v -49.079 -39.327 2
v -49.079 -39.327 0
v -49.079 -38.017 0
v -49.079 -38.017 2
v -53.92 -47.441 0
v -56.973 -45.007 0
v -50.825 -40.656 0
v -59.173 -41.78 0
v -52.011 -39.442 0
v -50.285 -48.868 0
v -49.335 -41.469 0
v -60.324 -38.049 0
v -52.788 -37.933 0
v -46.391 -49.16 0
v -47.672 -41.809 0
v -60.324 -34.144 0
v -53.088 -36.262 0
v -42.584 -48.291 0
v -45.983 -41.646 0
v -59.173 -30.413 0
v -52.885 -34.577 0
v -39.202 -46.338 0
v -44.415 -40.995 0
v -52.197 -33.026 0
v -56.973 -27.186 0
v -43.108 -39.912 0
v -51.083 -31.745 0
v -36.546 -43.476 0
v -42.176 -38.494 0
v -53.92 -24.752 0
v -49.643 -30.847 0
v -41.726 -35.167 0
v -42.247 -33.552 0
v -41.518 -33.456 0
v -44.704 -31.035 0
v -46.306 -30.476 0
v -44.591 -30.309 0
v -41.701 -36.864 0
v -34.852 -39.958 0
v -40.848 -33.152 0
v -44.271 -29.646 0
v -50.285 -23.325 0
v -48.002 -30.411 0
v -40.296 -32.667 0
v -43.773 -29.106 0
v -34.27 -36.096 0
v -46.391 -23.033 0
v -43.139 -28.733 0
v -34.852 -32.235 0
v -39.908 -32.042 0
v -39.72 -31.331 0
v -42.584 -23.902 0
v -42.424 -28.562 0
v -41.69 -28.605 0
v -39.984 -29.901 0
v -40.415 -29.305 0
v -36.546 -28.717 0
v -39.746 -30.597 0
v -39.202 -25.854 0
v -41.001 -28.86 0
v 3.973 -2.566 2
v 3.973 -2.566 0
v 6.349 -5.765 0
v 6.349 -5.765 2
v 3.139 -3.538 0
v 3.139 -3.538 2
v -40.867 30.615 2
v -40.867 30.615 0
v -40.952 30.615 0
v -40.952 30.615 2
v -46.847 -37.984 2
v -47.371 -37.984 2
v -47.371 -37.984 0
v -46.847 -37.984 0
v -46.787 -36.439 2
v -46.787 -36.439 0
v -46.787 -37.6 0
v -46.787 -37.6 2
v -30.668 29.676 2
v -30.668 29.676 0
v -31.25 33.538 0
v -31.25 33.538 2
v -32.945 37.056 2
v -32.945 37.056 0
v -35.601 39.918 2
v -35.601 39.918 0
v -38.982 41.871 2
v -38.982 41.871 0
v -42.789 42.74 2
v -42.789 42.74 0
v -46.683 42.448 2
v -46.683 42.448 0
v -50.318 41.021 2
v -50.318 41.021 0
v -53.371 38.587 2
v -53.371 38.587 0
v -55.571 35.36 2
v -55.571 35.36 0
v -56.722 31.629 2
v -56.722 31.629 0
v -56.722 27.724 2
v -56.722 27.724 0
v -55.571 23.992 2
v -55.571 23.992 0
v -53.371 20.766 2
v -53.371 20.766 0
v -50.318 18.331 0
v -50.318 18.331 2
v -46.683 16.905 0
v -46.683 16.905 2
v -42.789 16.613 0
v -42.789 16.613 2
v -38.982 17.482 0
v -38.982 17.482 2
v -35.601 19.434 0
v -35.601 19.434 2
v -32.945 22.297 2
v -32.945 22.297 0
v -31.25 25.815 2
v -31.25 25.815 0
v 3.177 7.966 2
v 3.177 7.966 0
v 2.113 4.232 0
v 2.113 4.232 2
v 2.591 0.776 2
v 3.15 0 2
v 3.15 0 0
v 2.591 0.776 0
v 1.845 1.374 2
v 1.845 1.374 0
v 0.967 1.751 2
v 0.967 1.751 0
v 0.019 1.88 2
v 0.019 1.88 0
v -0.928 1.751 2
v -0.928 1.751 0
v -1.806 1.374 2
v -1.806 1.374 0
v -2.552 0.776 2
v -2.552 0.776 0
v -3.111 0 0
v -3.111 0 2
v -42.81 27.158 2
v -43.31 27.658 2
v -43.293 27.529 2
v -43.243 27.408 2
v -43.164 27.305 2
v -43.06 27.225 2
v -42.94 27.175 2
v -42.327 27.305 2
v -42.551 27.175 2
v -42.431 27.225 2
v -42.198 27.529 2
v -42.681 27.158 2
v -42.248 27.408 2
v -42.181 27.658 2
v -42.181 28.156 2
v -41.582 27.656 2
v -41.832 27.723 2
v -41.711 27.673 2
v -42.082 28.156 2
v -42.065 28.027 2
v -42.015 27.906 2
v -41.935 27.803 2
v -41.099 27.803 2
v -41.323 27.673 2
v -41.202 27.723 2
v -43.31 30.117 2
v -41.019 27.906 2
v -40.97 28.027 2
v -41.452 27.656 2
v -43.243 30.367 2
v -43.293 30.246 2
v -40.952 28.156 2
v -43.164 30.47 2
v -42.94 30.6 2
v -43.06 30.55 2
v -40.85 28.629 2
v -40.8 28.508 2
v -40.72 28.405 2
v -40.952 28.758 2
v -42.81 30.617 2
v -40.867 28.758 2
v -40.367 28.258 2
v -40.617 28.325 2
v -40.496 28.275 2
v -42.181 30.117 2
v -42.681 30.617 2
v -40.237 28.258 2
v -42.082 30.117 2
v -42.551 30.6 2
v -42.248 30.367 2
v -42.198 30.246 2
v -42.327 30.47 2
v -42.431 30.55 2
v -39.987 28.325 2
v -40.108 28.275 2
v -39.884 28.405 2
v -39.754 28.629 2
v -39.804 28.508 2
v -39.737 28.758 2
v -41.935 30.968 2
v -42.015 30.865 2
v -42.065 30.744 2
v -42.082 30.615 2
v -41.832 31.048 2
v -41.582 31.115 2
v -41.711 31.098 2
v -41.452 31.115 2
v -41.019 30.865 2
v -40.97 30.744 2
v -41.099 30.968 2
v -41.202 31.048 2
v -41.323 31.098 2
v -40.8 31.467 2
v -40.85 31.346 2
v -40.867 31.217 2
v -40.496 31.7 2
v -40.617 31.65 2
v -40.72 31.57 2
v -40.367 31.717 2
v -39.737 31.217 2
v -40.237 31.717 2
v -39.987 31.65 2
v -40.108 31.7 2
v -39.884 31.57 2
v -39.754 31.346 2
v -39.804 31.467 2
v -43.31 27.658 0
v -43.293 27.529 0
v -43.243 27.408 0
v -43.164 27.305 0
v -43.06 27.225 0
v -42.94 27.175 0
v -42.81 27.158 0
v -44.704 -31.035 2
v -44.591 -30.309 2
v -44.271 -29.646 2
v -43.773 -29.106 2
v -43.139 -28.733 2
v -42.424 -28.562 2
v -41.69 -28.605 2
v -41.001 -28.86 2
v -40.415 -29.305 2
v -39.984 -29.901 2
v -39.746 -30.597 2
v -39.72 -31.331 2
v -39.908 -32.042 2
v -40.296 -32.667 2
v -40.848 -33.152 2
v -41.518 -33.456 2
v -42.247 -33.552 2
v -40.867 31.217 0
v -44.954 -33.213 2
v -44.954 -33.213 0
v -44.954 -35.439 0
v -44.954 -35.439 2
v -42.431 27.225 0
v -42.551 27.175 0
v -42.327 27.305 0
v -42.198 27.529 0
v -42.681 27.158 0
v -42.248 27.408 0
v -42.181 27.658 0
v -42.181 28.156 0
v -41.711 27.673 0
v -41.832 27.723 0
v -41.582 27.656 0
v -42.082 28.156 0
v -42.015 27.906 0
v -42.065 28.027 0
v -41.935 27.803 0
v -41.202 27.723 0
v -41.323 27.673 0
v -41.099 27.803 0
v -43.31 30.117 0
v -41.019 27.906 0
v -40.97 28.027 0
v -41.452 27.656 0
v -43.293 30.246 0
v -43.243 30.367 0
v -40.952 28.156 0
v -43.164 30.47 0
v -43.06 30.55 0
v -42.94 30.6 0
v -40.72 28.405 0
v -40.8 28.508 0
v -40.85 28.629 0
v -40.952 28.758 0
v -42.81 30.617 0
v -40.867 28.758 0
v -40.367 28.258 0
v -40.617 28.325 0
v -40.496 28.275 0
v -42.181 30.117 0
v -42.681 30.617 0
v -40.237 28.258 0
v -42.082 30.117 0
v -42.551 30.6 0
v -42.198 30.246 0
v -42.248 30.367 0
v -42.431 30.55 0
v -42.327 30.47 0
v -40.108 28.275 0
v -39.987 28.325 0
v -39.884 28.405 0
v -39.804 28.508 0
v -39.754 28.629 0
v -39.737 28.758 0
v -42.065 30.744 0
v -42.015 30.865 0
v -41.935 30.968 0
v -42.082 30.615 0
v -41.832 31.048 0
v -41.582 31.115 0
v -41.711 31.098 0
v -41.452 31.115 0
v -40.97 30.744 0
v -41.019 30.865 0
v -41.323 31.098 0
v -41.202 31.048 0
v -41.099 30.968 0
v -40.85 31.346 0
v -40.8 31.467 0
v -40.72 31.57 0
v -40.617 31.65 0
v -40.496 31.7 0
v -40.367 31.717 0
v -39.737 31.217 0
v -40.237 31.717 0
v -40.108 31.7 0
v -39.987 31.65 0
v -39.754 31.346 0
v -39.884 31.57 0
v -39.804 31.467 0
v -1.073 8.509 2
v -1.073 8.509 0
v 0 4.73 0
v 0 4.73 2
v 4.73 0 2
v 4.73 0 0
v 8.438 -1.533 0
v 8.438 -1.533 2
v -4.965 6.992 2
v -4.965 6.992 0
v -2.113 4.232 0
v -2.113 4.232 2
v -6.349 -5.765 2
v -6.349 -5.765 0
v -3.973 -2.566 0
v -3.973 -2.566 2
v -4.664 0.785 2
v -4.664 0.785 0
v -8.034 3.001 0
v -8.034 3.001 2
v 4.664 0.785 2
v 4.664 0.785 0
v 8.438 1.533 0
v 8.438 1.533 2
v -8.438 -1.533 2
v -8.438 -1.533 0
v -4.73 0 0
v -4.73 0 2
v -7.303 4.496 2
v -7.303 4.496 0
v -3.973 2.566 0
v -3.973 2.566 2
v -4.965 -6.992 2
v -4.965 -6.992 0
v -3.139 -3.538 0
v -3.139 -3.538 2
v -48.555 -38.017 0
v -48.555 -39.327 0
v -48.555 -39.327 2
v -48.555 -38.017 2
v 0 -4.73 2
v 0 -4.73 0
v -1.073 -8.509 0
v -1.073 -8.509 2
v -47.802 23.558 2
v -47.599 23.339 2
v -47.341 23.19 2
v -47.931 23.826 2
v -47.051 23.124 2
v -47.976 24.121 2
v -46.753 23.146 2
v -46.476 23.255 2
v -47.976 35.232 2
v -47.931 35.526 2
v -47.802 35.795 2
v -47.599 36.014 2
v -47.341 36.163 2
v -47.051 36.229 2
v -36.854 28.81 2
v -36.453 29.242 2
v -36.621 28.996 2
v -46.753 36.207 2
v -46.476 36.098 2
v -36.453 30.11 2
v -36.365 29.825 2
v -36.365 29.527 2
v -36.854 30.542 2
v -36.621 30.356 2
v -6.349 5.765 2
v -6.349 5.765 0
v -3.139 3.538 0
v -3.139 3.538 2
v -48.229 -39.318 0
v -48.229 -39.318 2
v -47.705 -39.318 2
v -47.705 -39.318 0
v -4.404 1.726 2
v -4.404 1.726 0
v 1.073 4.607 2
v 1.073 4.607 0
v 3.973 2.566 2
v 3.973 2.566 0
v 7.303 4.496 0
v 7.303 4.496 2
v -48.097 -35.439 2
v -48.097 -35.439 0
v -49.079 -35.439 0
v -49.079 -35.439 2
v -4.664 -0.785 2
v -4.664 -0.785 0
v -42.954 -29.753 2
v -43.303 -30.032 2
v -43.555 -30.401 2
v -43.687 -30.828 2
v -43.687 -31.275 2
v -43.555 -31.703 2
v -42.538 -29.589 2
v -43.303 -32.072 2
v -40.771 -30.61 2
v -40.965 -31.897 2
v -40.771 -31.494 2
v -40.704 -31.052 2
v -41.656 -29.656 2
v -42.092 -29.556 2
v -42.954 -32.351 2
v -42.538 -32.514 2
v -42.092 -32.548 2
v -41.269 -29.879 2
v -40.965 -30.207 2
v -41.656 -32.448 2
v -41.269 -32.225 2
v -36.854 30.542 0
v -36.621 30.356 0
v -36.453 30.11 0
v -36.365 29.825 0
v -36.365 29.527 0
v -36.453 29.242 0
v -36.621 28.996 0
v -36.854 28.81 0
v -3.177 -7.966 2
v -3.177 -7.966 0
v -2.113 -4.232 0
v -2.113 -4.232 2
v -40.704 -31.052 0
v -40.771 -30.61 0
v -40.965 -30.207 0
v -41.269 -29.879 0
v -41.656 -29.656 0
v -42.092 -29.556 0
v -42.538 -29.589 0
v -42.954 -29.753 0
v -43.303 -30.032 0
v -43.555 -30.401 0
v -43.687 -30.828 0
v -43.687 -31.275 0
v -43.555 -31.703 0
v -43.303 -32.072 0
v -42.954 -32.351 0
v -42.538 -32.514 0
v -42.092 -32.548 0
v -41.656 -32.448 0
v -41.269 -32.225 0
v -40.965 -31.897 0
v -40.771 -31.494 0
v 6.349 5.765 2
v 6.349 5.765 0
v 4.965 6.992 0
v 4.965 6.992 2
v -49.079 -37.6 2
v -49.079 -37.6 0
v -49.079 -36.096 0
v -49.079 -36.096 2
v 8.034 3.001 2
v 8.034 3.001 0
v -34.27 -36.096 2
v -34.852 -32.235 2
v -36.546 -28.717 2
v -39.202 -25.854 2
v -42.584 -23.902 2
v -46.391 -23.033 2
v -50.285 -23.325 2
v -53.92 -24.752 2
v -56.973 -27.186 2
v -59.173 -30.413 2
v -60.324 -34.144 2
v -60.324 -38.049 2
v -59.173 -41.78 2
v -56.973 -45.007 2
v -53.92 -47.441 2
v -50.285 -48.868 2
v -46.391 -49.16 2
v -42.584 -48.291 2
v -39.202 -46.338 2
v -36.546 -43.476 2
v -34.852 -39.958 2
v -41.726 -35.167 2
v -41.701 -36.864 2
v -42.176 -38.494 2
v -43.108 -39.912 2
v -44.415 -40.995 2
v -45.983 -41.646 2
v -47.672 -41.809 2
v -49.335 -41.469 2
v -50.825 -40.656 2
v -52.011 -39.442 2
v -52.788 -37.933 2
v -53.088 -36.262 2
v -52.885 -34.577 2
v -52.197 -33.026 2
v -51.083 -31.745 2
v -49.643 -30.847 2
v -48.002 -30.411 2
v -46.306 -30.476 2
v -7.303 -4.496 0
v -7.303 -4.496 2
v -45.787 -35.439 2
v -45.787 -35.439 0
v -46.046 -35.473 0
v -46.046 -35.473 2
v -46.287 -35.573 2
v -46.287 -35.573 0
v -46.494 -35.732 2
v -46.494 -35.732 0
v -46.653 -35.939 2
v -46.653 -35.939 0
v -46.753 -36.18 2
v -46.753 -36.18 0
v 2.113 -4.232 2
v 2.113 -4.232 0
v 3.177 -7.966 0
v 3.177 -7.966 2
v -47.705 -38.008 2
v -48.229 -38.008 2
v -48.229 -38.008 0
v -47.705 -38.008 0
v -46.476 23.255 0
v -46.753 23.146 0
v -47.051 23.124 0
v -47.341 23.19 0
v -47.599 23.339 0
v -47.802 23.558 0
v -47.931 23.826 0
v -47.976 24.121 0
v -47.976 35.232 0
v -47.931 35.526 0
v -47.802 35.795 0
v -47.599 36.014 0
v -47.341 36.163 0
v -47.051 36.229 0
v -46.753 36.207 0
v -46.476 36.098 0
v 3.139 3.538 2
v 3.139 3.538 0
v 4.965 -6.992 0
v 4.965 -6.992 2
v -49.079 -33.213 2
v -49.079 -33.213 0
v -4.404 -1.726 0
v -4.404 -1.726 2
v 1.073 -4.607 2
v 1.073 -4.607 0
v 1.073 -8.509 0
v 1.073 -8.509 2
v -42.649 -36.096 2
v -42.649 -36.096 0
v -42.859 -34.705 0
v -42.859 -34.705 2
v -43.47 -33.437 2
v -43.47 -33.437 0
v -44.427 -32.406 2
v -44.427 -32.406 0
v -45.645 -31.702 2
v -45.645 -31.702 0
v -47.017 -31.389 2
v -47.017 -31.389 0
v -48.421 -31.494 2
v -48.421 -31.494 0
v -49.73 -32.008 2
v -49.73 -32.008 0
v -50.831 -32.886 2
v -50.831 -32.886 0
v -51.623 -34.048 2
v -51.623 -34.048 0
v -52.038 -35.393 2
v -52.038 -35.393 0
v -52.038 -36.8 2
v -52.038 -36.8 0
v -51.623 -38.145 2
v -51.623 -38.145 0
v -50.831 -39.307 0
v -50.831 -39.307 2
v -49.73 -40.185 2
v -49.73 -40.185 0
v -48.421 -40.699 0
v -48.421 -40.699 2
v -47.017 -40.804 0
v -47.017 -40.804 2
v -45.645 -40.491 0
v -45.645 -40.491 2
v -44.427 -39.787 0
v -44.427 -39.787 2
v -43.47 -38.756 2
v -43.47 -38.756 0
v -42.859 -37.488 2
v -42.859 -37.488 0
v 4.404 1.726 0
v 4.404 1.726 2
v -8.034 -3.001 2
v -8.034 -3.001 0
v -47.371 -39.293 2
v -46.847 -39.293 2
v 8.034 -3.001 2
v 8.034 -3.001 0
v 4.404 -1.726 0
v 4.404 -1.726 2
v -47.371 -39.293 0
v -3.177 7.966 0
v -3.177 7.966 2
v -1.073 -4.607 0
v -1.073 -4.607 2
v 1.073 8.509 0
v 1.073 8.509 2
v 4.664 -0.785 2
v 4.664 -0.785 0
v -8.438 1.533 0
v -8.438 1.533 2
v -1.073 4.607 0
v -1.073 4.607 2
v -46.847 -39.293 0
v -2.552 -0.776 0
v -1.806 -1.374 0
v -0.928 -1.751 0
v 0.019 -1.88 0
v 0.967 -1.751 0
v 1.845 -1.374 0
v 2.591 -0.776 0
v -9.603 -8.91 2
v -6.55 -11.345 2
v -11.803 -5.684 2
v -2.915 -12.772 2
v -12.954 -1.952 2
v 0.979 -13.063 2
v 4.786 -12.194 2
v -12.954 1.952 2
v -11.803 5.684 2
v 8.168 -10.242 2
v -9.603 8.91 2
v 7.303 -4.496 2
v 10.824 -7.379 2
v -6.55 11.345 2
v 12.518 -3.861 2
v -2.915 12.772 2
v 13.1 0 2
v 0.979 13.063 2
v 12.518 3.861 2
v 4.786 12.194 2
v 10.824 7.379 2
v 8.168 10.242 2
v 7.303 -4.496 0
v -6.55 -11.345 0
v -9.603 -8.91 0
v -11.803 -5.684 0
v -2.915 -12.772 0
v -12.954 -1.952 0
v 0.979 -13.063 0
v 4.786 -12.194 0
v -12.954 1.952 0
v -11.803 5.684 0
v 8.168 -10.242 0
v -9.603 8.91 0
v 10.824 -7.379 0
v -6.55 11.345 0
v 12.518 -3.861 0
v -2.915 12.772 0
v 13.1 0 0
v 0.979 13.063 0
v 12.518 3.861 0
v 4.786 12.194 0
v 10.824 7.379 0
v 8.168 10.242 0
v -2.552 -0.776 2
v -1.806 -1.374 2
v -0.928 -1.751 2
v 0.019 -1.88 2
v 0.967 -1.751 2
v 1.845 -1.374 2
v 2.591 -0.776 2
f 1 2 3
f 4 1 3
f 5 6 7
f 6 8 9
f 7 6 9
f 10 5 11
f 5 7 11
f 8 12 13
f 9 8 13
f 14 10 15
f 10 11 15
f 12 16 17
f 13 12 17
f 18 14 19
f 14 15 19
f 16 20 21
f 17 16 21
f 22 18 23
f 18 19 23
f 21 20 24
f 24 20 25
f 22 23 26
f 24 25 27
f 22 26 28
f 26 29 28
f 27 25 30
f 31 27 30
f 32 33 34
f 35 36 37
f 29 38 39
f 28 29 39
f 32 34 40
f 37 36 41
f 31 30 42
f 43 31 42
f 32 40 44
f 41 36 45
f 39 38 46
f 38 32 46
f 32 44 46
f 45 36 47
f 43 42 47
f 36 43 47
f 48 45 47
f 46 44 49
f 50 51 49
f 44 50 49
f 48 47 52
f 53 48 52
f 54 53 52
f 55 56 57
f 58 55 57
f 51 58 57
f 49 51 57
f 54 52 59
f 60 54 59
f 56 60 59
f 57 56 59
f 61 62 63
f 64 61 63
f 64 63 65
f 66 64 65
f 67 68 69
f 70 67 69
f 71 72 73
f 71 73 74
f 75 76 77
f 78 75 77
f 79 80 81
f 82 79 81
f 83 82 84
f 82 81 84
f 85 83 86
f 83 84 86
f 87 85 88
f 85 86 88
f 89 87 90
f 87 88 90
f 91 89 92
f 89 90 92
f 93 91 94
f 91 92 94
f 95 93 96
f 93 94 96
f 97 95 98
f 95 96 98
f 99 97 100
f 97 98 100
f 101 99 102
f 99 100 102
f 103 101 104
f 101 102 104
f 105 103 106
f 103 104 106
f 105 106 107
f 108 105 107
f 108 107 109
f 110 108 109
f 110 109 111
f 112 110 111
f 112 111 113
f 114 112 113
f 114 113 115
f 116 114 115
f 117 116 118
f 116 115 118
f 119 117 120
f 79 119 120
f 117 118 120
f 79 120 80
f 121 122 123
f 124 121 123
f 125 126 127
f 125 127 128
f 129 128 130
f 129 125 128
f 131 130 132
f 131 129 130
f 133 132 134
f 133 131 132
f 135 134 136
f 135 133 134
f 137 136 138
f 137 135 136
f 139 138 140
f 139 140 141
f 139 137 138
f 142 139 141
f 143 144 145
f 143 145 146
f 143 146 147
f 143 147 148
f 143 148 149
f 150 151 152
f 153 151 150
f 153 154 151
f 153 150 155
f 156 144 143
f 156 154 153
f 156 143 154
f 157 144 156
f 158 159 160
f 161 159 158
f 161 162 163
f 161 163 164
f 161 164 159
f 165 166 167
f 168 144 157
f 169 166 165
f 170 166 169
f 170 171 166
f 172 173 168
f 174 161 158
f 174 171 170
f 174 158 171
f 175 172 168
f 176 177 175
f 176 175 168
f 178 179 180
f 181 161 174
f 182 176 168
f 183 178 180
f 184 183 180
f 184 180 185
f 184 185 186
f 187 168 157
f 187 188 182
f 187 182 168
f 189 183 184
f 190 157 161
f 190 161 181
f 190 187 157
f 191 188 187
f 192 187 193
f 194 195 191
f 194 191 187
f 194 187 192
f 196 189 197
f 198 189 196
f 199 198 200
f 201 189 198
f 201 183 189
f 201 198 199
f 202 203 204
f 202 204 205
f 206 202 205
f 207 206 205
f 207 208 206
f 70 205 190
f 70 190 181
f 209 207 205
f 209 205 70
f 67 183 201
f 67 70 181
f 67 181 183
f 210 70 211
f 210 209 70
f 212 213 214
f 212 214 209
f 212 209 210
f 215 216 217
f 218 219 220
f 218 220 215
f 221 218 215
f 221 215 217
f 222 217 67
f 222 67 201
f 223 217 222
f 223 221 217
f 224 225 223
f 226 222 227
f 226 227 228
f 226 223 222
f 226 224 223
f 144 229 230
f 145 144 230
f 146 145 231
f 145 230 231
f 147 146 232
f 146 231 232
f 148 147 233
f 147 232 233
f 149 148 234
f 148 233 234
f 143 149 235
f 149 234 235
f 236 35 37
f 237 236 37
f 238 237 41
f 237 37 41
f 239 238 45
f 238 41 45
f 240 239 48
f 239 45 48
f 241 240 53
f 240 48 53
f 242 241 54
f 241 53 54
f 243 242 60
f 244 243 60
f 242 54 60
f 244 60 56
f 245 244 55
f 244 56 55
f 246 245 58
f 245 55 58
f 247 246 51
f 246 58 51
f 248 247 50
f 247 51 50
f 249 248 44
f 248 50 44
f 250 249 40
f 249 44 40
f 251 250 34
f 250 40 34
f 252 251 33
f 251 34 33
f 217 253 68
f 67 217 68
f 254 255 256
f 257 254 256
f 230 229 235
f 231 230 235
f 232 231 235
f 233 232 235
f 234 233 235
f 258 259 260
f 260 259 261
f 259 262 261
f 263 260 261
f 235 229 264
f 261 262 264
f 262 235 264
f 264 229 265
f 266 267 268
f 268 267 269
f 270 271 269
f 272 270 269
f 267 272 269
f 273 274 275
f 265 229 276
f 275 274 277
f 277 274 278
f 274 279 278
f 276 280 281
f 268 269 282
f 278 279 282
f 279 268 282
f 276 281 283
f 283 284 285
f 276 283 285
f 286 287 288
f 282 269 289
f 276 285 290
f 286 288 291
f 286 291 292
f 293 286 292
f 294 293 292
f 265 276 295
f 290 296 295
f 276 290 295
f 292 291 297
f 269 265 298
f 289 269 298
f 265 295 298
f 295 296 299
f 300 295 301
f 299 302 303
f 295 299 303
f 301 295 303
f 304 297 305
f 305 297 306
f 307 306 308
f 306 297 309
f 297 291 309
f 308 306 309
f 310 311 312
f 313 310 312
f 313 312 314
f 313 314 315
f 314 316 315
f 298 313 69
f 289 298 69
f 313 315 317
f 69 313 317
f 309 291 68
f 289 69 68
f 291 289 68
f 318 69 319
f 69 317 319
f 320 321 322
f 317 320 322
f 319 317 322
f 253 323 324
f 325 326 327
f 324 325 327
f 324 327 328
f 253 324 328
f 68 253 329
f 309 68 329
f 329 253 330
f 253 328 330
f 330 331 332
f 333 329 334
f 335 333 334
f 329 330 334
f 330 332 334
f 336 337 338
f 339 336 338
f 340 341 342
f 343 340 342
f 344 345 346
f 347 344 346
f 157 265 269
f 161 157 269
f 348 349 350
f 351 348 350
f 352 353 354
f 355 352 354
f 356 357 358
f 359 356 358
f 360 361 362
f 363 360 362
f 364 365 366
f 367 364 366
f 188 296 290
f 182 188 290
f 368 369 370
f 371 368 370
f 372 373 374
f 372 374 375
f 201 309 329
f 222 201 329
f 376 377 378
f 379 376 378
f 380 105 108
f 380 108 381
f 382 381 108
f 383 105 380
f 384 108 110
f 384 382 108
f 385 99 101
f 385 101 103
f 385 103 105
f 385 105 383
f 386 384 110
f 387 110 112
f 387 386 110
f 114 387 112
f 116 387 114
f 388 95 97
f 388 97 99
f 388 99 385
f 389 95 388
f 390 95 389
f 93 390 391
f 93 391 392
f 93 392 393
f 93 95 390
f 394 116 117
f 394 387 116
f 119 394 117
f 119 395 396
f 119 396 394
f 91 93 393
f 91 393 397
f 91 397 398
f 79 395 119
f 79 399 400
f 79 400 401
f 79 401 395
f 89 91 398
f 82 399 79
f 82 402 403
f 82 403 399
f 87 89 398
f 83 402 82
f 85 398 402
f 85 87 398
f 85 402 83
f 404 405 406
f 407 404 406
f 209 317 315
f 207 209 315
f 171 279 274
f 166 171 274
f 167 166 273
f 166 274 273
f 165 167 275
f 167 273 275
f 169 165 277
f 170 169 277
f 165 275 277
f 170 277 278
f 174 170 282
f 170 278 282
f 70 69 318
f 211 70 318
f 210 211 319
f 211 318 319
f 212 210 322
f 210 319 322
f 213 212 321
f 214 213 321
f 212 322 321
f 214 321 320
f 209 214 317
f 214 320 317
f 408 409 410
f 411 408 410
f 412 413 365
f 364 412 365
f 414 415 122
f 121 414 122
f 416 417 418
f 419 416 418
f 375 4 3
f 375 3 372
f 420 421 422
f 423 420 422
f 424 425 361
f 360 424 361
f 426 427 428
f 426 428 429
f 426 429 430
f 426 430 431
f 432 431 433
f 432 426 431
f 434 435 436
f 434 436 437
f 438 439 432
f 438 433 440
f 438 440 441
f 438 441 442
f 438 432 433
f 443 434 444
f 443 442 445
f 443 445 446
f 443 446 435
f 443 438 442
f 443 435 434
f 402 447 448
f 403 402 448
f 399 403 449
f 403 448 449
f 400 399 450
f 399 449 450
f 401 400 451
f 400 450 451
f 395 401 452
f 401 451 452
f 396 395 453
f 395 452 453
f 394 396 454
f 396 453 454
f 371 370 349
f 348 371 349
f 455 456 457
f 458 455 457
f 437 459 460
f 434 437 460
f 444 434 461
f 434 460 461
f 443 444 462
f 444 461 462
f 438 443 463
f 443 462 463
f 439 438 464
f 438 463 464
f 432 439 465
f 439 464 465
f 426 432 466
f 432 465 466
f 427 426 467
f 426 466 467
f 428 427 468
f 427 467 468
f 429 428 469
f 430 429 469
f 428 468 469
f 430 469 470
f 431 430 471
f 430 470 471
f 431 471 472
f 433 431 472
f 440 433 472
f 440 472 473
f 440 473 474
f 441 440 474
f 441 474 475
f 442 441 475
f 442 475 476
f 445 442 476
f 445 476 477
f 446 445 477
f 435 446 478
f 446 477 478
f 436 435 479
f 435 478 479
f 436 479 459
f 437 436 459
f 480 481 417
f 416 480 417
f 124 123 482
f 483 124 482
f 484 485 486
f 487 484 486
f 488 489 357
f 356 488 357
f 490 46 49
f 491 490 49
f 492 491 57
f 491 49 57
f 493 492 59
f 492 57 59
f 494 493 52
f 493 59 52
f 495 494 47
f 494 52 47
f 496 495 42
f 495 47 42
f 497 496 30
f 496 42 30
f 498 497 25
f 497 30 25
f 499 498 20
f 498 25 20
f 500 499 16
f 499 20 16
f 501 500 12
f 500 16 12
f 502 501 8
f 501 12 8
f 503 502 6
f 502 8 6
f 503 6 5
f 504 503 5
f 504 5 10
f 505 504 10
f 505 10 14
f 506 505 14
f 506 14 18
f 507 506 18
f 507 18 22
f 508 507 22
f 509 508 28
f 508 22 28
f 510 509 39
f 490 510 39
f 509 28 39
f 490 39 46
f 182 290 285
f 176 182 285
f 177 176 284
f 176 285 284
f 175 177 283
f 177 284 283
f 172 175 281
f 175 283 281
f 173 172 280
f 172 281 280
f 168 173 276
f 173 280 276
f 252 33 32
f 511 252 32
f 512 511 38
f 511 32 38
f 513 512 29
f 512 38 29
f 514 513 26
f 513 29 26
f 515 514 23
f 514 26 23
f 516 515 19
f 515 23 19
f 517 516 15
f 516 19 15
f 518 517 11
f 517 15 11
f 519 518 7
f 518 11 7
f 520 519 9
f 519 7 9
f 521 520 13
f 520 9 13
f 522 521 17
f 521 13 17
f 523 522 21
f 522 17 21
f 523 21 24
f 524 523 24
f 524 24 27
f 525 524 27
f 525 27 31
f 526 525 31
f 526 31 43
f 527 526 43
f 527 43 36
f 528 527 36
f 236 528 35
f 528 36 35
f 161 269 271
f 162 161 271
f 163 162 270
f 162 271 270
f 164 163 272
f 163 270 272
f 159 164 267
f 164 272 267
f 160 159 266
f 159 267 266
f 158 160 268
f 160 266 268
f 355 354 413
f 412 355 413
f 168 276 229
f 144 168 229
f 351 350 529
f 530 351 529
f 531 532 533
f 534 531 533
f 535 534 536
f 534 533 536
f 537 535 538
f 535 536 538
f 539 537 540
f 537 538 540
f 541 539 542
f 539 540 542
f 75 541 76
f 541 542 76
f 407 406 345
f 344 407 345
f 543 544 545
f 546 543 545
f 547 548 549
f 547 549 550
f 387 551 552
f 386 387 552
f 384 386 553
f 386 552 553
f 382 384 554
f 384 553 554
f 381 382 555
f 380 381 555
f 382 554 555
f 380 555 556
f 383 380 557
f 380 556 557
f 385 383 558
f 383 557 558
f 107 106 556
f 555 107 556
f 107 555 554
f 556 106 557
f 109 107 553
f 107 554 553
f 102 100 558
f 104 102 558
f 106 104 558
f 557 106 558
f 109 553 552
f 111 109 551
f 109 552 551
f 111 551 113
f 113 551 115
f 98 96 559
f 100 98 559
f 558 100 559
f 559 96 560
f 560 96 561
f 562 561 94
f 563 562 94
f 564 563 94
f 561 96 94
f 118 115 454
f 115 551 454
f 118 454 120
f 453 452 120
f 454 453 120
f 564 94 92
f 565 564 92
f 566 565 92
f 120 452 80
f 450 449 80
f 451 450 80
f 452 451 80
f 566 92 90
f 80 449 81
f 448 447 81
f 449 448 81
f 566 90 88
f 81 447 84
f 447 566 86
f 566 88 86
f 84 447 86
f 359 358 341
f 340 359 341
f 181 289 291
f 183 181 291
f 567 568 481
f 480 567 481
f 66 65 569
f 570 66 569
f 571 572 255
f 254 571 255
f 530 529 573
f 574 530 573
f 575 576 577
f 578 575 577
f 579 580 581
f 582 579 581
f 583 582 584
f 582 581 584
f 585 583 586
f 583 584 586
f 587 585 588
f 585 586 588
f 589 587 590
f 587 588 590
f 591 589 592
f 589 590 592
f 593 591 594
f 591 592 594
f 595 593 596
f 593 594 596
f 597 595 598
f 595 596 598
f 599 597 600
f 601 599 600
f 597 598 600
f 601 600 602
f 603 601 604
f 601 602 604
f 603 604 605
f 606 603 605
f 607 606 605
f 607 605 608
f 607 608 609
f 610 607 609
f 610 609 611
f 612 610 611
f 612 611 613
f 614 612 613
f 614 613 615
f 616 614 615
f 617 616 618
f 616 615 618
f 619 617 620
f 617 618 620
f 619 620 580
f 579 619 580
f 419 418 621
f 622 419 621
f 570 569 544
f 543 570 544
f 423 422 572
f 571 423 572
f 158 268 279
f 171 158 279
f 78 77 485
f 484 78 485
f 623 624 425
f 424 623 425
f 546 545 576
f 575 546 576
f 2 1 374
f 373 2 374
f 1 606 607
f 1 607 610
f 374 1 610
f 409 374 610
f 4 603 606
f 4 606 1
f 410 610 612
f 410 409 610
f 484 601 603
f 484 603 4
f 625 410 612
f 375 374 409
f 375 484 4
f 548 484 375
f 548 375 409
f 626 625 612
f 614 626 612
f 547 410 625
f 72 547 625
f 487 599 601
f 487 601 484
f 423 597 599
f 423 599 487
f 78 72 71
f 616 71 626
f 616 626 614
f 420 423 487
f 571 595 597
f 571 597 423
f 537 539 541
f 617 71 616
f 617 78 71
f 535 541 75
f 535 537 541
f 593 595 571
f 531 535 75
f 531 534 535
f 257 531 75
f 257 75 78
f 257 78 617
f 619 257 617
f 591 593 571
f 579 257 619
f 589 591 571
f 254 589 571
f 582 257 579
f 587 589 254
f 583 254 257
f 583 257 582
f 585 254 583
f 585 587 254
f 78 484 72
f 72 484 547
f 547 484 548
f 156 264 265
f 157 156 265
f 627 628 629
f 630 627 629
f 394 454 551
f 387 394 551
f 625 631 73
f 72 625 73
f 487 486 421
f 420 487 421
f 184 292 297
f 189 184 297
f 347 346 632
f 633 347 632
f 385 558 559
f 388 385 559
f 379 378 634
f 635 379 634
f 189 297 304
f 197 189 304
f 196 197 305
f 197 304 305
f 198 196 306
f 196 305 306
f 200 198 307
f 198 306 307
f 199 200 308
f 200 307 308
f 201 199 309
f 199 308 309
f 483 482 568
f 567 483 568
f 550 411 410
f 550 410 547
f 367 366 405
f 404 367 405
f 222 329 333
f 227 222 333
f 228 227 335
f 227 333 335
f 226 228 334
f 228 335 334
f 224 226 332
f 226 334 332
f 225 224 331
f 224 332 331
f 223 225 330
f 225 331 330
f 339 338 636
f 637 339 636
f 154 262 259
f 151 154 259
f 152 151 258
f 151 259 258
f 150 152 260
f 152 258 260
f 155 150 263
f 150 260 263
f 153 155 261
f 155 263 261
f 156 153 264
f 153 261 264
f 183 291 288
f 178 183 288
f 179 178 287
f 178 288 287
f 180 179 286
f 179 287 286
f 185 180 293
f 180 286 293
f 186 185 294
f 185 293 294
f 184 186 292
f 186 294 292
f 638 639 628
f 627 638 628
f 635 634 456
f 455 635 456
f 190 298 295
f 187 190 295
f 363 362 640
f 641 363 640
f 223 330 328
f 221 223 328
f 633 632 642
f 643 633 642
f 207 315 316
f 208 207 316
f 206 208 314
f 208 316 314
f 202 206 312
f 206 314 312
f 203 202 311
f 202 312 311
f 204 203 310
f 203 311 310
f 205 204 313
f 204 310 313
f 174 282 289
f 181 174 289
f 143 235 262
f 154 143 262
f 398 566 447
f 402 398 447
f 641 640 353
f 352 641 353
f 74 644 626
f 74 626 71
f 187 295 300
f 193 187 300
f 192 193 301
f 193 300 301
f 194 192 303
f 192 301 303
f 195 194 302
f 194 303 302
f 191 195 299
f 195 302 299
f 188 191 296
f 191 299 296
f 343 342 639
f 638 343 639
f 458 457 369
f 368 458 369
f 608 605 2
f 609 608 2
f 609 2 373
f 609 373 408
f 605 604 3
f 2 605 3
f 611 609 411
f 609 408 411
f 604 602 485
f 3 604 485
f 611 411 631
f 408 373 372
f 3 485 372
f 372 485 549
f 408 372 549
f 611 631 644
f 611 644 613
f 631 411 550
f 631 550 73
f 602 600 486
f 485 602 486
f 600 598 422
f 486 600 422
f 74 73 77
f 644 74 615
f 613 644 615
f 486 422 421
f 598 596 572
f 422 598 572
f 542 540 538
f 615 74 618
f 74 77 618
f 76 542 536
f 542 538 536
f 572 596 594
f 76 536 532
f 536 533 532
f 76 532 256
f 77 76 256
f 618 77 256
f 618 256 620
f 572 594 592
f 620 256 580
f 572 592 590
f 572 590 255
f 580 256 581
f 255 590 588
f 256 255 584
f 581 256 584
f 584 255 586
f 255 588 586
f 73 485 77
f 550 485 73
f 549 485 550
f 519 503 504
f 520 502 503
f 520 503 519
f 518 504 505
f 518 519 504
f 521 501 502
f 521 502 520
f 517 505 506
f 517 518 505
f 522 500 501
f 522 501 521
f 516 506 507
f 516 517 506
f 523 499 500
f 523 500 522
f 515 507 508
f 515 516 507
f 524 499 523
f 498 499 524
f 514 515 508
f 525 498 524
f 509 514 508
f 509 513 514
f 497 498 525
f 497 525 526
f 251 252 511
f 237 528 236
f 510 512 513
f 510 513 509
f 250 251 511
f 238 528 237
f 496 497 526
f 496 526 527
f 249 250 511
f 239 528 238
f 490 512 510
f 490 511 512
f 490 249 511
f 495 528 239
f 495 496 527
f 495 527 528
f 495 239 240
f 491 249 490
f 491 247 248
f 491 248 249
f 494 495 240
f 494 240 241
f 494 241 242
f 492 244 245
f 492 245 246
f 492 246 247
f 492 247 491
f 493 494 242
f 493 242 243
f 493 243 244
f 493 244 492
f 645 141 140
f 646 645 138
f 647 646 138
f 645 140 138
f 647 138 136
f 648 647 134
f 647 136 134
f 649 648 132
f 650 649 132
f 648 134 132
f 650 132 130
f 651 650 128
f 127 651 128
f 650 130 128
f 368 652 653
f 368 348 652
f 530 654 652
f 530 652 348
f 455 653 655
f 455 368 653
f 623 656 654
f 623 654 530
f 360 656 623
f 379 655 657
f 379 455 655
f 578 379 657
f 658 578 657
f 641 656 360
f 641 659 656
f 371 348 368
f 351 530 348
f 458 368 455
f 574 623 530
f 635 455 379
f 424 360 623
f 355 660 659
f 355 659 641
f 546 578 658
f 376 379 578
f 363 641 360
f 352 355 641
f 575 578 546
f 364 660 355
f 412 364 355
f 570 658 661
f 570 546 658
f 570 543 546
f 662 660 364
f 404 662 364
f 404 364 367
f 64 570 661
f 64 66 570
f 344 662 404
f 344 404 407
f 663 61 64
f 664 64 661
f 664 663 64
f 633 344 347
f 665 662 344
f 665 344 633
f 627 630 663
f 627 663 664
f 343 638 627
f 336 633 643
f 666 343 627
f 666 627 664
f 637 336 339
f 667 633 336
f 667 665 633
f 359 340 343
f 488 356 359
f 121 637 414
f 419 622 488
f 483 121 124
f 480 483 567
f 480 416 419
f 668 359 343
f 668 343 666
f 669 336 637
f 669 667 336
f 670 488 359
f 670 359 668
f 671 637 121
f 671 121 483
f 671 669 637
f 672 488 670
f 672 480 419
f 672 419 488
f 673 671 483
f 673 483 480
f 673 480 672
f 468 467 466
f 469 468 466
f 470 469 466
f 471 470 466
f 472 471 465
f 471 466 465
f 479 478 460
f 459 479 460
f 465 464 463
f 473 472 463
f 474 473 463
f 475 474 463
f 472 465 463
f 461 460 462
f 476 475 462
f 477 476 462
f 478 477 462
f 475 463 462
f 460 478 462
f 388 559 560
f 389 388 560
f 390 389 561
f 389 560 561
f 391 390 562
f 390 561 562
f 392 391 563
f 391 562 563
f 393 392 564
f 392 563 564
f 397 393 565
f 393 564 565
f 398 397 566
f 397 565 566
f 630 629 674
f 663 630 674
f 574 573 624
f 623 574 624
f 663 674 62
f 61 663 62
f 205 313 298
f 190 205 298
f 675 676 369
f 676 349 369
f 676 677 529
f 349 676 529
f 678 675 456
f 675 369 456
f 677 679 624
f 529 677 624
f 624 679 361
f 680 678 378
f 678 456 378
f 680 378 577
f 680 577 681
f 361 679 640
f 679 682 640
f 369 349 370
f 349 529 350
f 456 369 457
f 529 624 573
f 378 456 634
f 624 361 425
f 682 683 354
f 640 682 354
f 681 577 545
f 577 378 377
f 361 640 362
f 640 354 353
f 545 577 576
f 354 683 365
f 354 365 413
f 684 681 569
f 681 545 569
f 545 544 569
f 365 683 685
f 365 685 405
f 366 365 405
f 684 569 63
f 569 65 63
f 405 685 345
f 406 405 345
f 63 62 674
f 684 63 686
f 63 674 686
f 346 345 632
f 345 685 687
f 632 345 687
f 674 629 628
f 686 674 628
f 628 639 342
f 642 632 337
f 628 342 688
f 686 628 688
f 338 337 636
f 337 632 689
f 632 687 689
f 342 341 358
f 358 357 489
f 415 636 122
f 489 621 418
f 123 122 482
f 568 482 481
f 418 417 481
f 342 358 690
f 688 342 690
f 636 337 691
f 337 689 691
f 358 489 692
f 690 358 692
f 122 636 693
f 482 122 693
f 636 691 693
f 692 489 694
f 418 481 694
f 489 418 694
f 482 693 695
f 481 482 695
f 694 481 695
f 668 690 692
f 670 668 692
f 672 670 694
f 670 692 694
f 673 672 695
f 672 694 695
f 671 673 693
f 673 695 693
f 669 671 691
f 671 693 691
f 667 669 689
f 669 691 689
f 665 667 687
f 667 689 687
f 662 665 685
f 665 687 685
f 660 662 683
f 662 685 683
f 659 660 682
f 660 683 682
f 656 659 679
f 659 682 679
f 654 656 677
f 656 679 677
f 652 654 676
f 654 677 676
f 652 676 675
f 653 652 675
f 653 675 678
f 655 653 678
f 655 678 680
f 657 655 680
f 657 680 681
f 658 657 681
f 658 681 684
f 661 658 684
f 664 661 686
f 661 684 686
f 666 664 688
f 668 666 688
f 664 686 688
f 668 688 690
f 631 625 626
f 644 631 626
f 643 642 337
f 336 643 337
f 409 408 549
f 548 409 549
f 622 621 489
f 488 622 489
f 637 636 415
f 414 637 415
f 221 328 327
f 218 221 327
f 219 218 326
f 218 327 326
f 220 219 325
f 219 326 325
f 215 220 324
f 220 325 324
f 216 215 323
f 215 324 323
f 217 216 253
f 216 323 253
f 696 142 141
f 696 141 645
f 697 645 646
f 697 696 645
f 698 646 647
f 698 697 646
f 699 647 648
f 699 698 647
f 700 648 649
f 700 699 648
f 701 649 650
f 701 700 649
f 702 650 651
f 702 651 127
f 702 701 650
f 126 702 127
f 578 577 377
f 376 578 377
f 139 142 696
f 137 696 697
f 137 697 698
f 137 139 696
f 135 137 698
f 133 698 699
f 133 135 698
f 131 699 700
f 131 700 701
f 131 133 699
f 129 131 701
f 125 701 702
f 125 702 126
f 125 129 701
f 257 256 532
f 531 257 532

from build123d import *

# Parameters (mm, degrees)
F0_R     = 13.1
F1_DEPTH = 2
F3_DEPTH = 2
F2_R     = 13.1
F4_R     = 13.1
F5_DEPTH = 2
F4_R_2   = 1.5
F4_R_3   = 4.720675959
F4_W     = 0.5238242447
F4_H     = 1.3095550239
F7_DEPTH = 2


with BuildPart() as f1:
    # F0 (on Top) → F1 (new body)
    with BuildSketch(Plane.XY):
        Circle(F0_R)
        Polygon((-1.0733311857, 8.5085036043), (0, 4.73), (1.0733311857, 8.5085036043), (1.0733311857, 4.6066104856), (3.1767945382, 7.9658426974), (2.1126727823, 4.2319633405), (4.9654196676, 6.9922300407), (3.1394469995, 3.5379051057), (6.3489288674, 5.7652212147), (3.9732828103, 2.5663054591), (7.302839339, 4.4961328948), (4.403985486, 1.72563375), (8.0336946235, 3.0010704948), (4.6643889337, 0.7850960928), (8.4377682627, 1.5332123671), (4.73, 0), (8.4377682627, -1.5332123671), (4.6643889337, -0.7850960928), (8.0336946235, -3.0010704948), (4.403985486, -1.72563375), (7.302839339, -4.4961328948), (3.9732828103, -2.5663054591), (6.3489288674, -5.7652212147), (3.1394469995, -3.5379051057), (4.9654196676, -6.9922300407), (2.1126727823, -4.2319633405), (3.1767945382, -7.9658426974), (1.0733311857, -4.6066104856), (1.0733311857, -8.5085036043), (0, -4.73), (-1.0733311857, -8.5085036043), (-1.0733311857, -4.6066104856), (-3.1767945382, -7.9658426974), (-2.1126727823, -4.2319633405), (-4.9654196676, -6.9922300407), (-3.1394469995, -3.5379051057), (-6.3489288674, -5.7652212147), (-3.9732828103, -2.5663054591), (-7.302839339, -4.4961328948), (-4.403985486, -1.72563375), (-8.0336946235, -3.0010704948), (-4.6643889337, -0.7850960928), (-8.4377682627, -1.5332123671), (-4.73, 0), (-8.4377682627, 1.5332123671), (-4.6643889337, 0.7850960928), (-8.0336946235, 3.0010704948), (-4.403985486, 1.72563375), (-7.302839339, 4.4961328948), (-3.9732828103, 2.5663054591), (-6.3489288674, 5.7652212147), (-3.1394469995, 3.5379051057), (-4.9654196676, 6.9922300407), (-2.1126727823, 4.2319633405), (-3.1767945382, 7.9658426974), (-1.0733311857, 4.6066104856), align=None, mode=Mode.SUBTRACT)
    extrude(amount=F1_DEPTH)


with BuildPart() as f3:
    # F2 (on Top) → F3 (new body)
    with BuildSketch(Plane.XY):
        with BuildLine():
            ThreePointArc((-39.7374145687, 31.2168422043), (-39.8838611781, 31.5703955949), (-40.2374145687, 31.7168422043))
            Line((-40.2374145687, 31.7168422043), (-40.3667549491, 31.7168422043))
            ThreePointArc((-40.3667549491, 31.7168422043), (-40.7203083397, 31.5703955949), (-40.8667549491, 31.2168422043))
            Line((-40.8667549491, 31.2168422043), (-40.8667549491, 30.6146760359))
            Line((-40.8667549491, 30.6146760359), (-40.9524645656, 30.6146760359))
            ThreePointArc((-40.9524645656, 30.6146760359), (-41.098911175, 30.9682294265), (-41.4524645656, 31.1146760359))
            Line((-41.4524645656, 31.1146760359), (-41.5818049461, 31.1146760359))
            ThreePointArc((-41.5818049461, 31.1146760359), (-41.9353583367, 30.9682294265), (-42.0818049461, 30.6146760359))
            Line((-42.0818049461, 30.6146760359), (-42.0818049461, 30.1166922674))
            Line((-42.0818049461, 30.1166922674), (-42.1808343381, 30.1166922674))
            ThreePointArc((-42.1808343381, 30.1166922674), (-42.3272809475, 30.470245658), (-42.6808343381, 30.6166922674))
            Line((-42.6808343381, 30.6166922674), (-42.8101747185, 30.6166922674))
            ThreePointArc((-42.8101747185, 30.6166922674), (-43.1637281091, 30.470245658), (-43.3101747185, 30.1166922674))
            Line((-43.3101747185, 30.1166922674), (-43.3101747185, 27.6580899134))
            ThreePointArc((-43.3101747185, 27.6580899134), (-43.1637281091, 27.3045365228), (-42.8101747185, 27.1580899134))
            Line((-42.8101747185, 27.1580899134), (-42.6808343381, 27.1580899134))
            ThreePointArc((-42.6808343381, 27.1580899134), (-42.3272809475, 27.3045365228), (-42.1808343381, 27.6580899134))
            Line((-42.1808343381, 27.6580899134), (-42.1808343381, 28.156073682))
            Line((-42.1808343381, 28.156073682), (-42.0818049461, 28.156073682))
            ThreePointArc((-42.0818049461, 28.156073682), (-41.9353583367, 27.8025202914), (-41.5818049461, 27.656073682))
            Line((-41.5818049461, 27.656073682), (-41.4524645656, 27.656073682))
            ThreePointArc((-41.4524645656, 27.656073682), (-41.098911175, 27.8025202914), (-40.9524645656, 28.156073682))
            Line((-40.9524645656, 28.156073682), (-40.9524645656, 28.7582398504))
            Line((-40.9524645656, 28.7582398504), (-40.8667549491, 28.7582398504))
            ThreePointArc((-40.8667549491, 28.7582398504), (-40.7203083397, 28.4046864598), (-40.3667549491, 28.2582398504))
            Line((-40.3667549491, 28.2582398504), (-40.2374145687, 28.2582398504))
            ThreePointArc((-40.2374145687, 28.2582398504), (-39.8838611781, 28.4046864598), (-39.7374145687, 28.7582398504))
            Line((-39.7374145687, 28.7582398504), (-39.7374145687, 31.2168422043))
        make_face()
    extrude(amount=F3_DEPTH)


with BuildPart() as f3b:
    # F2 (on Top) → F3, piece 2 (new body)
    with BuildSketch(Plane.XY):
        with Locations((-43.7684245408, 29.6763181686)):
            Circle(F2_R)
        with BuildLine():
            ThreePointArc((-36.85361588, 30.5423435724), (-36.35361588, 29.6763181686), (-36.85361588, 28.8102927649))
            Line((-36.85361588, 28.8102927649), (-46.4758288711, 23.2549055042))
            ThreePointArc((-46.4758288711, 23.2549055042), (-47.4758288711, 23.2549055042), (-47.9758288711, 24.120930908))
            Line((-47.9758288711, 24.120930908), (-47.9758288711, 35.2317054293))
            ThreePointArc((-47.9758288711, 35.2317054293), (-47.4758288711, 36.097730833), (-46.4758288711, 36.097730833))
            Line((-46.4758288711, 36.097730833), (-36.85361588, 30.5423435724))
        make_face(mode=Mode.SUBTRACT)
    extrude(amount=F3_DEPTH)


with BuildPart() as f5:
    # F4 (on Top) → F5 (new body)
    with BuildSketch(Plane.XY):
        with Locations((-47.3701506853, -36.0964685678)):
            Circle(F4_R)
        with BuildLine():
            ThreePointArc((-44.7038361124, -31.0351545067), (-40.4151887582, -29.3052944653), (-42.2467432767, -33.5515068878))
            ThreePointArc((-42.2467432767, -33.5515068878), (-51.4631873897, -40.0931151576), (-44.7038361124, -31.0351545067))
        make_face(mode=Mode.SUBTRACT)
    extrude(amount=F5_DEPTH)


with BuildPart() as f5b:
    # F4 (on Top) → F5, piece 2 (new body)
    with BuildSketch(Plane.XY):
        with Locations((-42.2038920224, -31.0518741608)):
            Circle(F4_R_2)
    extrude(amount=F5_DEPTH)


with BuildPart() as f5c:
    # F4 (on Top) → F5, piece 3 (new body)
    with BuildSketch(Plane.XY):
        with Locations((-47.3701506853, -36.0964685678)):
            Circle(F4_R_3)
        with Locations((-48.8171372563, -38.6720318347)):
            Rectangle(F4_W, F4_H, mode=Mode.SUBTRACT)
        with Locations((-47.9673407972, -38.6631265283)):
            Rectangle(F4_W, F4_H, mode=Mode.SUBTRACT)
        with Locations((-47.1089147031, -38.6386029422)):
            Rectangle(F4_W, F4_H, mode=Mode.SUBTRACT)
        with BuildLine():
            Line((-46.7873290181, -33.2126356661), (-44.9539572001, -33.2126356661))
            Line((-44.9539572001, -33.2126356661), (-44.9539572001, -35.4388765991))
            Line((-44.9539572001, -35.4388765991), (-45.7873290181, -35.4388765991))
            ThreePointArc((-45.7873290181, -35.4388765991), (-46.4944357993, -35.7317698179), (-46.7873290181, -36.4388765991))
            Line((-46.7873290181, -36.4388765991), (-46.7873290181, -37.5996418297))
            Line((-46.7873290181, -37.5996418297), (-49.0790493786, -37.5996418297))
            Line((-49.0790493786, -37.5996418297), (-49.0790493786, -36.0964685678))
            Line((-49.0790493786, -36.0964685678), (-48.096884042, -35.4388765991))
            Line((-48.096884042, -35.4388765991), (-49.0790493786, -35.4388765991))
            Line((-49.0790493786, -35.4388765991), (-49.0790493786, -33.2126356661))
            Line((-49.0790493786, -33.2126356661), (-46.7873290181, -33.2126356661))
        make_face(mode=Mode.SUBTRACT)
    extrude(amount=F5_DEPTH)


with BuildPart() as f7:
    # F6 (on face) → F7 (new body)
    with BuildSketch(Plane.XY.offset(2)):
        with BuildLine():
            ThreePointArc((3.1499457546, 0), (0.0193092274, 1.879606606), (-3.1113272998, 0))
            ThreePointArc((-3.1113272998, 0), (0.0193092274, -1.879606606), (3.1499457546, 0))
        make_face()
    extrude(amount=-F7_DEPTH)


solid = Compound([f1.part, f3.part, f3b.part, f5.part, f5b.part, f5c.part, f7.part])
